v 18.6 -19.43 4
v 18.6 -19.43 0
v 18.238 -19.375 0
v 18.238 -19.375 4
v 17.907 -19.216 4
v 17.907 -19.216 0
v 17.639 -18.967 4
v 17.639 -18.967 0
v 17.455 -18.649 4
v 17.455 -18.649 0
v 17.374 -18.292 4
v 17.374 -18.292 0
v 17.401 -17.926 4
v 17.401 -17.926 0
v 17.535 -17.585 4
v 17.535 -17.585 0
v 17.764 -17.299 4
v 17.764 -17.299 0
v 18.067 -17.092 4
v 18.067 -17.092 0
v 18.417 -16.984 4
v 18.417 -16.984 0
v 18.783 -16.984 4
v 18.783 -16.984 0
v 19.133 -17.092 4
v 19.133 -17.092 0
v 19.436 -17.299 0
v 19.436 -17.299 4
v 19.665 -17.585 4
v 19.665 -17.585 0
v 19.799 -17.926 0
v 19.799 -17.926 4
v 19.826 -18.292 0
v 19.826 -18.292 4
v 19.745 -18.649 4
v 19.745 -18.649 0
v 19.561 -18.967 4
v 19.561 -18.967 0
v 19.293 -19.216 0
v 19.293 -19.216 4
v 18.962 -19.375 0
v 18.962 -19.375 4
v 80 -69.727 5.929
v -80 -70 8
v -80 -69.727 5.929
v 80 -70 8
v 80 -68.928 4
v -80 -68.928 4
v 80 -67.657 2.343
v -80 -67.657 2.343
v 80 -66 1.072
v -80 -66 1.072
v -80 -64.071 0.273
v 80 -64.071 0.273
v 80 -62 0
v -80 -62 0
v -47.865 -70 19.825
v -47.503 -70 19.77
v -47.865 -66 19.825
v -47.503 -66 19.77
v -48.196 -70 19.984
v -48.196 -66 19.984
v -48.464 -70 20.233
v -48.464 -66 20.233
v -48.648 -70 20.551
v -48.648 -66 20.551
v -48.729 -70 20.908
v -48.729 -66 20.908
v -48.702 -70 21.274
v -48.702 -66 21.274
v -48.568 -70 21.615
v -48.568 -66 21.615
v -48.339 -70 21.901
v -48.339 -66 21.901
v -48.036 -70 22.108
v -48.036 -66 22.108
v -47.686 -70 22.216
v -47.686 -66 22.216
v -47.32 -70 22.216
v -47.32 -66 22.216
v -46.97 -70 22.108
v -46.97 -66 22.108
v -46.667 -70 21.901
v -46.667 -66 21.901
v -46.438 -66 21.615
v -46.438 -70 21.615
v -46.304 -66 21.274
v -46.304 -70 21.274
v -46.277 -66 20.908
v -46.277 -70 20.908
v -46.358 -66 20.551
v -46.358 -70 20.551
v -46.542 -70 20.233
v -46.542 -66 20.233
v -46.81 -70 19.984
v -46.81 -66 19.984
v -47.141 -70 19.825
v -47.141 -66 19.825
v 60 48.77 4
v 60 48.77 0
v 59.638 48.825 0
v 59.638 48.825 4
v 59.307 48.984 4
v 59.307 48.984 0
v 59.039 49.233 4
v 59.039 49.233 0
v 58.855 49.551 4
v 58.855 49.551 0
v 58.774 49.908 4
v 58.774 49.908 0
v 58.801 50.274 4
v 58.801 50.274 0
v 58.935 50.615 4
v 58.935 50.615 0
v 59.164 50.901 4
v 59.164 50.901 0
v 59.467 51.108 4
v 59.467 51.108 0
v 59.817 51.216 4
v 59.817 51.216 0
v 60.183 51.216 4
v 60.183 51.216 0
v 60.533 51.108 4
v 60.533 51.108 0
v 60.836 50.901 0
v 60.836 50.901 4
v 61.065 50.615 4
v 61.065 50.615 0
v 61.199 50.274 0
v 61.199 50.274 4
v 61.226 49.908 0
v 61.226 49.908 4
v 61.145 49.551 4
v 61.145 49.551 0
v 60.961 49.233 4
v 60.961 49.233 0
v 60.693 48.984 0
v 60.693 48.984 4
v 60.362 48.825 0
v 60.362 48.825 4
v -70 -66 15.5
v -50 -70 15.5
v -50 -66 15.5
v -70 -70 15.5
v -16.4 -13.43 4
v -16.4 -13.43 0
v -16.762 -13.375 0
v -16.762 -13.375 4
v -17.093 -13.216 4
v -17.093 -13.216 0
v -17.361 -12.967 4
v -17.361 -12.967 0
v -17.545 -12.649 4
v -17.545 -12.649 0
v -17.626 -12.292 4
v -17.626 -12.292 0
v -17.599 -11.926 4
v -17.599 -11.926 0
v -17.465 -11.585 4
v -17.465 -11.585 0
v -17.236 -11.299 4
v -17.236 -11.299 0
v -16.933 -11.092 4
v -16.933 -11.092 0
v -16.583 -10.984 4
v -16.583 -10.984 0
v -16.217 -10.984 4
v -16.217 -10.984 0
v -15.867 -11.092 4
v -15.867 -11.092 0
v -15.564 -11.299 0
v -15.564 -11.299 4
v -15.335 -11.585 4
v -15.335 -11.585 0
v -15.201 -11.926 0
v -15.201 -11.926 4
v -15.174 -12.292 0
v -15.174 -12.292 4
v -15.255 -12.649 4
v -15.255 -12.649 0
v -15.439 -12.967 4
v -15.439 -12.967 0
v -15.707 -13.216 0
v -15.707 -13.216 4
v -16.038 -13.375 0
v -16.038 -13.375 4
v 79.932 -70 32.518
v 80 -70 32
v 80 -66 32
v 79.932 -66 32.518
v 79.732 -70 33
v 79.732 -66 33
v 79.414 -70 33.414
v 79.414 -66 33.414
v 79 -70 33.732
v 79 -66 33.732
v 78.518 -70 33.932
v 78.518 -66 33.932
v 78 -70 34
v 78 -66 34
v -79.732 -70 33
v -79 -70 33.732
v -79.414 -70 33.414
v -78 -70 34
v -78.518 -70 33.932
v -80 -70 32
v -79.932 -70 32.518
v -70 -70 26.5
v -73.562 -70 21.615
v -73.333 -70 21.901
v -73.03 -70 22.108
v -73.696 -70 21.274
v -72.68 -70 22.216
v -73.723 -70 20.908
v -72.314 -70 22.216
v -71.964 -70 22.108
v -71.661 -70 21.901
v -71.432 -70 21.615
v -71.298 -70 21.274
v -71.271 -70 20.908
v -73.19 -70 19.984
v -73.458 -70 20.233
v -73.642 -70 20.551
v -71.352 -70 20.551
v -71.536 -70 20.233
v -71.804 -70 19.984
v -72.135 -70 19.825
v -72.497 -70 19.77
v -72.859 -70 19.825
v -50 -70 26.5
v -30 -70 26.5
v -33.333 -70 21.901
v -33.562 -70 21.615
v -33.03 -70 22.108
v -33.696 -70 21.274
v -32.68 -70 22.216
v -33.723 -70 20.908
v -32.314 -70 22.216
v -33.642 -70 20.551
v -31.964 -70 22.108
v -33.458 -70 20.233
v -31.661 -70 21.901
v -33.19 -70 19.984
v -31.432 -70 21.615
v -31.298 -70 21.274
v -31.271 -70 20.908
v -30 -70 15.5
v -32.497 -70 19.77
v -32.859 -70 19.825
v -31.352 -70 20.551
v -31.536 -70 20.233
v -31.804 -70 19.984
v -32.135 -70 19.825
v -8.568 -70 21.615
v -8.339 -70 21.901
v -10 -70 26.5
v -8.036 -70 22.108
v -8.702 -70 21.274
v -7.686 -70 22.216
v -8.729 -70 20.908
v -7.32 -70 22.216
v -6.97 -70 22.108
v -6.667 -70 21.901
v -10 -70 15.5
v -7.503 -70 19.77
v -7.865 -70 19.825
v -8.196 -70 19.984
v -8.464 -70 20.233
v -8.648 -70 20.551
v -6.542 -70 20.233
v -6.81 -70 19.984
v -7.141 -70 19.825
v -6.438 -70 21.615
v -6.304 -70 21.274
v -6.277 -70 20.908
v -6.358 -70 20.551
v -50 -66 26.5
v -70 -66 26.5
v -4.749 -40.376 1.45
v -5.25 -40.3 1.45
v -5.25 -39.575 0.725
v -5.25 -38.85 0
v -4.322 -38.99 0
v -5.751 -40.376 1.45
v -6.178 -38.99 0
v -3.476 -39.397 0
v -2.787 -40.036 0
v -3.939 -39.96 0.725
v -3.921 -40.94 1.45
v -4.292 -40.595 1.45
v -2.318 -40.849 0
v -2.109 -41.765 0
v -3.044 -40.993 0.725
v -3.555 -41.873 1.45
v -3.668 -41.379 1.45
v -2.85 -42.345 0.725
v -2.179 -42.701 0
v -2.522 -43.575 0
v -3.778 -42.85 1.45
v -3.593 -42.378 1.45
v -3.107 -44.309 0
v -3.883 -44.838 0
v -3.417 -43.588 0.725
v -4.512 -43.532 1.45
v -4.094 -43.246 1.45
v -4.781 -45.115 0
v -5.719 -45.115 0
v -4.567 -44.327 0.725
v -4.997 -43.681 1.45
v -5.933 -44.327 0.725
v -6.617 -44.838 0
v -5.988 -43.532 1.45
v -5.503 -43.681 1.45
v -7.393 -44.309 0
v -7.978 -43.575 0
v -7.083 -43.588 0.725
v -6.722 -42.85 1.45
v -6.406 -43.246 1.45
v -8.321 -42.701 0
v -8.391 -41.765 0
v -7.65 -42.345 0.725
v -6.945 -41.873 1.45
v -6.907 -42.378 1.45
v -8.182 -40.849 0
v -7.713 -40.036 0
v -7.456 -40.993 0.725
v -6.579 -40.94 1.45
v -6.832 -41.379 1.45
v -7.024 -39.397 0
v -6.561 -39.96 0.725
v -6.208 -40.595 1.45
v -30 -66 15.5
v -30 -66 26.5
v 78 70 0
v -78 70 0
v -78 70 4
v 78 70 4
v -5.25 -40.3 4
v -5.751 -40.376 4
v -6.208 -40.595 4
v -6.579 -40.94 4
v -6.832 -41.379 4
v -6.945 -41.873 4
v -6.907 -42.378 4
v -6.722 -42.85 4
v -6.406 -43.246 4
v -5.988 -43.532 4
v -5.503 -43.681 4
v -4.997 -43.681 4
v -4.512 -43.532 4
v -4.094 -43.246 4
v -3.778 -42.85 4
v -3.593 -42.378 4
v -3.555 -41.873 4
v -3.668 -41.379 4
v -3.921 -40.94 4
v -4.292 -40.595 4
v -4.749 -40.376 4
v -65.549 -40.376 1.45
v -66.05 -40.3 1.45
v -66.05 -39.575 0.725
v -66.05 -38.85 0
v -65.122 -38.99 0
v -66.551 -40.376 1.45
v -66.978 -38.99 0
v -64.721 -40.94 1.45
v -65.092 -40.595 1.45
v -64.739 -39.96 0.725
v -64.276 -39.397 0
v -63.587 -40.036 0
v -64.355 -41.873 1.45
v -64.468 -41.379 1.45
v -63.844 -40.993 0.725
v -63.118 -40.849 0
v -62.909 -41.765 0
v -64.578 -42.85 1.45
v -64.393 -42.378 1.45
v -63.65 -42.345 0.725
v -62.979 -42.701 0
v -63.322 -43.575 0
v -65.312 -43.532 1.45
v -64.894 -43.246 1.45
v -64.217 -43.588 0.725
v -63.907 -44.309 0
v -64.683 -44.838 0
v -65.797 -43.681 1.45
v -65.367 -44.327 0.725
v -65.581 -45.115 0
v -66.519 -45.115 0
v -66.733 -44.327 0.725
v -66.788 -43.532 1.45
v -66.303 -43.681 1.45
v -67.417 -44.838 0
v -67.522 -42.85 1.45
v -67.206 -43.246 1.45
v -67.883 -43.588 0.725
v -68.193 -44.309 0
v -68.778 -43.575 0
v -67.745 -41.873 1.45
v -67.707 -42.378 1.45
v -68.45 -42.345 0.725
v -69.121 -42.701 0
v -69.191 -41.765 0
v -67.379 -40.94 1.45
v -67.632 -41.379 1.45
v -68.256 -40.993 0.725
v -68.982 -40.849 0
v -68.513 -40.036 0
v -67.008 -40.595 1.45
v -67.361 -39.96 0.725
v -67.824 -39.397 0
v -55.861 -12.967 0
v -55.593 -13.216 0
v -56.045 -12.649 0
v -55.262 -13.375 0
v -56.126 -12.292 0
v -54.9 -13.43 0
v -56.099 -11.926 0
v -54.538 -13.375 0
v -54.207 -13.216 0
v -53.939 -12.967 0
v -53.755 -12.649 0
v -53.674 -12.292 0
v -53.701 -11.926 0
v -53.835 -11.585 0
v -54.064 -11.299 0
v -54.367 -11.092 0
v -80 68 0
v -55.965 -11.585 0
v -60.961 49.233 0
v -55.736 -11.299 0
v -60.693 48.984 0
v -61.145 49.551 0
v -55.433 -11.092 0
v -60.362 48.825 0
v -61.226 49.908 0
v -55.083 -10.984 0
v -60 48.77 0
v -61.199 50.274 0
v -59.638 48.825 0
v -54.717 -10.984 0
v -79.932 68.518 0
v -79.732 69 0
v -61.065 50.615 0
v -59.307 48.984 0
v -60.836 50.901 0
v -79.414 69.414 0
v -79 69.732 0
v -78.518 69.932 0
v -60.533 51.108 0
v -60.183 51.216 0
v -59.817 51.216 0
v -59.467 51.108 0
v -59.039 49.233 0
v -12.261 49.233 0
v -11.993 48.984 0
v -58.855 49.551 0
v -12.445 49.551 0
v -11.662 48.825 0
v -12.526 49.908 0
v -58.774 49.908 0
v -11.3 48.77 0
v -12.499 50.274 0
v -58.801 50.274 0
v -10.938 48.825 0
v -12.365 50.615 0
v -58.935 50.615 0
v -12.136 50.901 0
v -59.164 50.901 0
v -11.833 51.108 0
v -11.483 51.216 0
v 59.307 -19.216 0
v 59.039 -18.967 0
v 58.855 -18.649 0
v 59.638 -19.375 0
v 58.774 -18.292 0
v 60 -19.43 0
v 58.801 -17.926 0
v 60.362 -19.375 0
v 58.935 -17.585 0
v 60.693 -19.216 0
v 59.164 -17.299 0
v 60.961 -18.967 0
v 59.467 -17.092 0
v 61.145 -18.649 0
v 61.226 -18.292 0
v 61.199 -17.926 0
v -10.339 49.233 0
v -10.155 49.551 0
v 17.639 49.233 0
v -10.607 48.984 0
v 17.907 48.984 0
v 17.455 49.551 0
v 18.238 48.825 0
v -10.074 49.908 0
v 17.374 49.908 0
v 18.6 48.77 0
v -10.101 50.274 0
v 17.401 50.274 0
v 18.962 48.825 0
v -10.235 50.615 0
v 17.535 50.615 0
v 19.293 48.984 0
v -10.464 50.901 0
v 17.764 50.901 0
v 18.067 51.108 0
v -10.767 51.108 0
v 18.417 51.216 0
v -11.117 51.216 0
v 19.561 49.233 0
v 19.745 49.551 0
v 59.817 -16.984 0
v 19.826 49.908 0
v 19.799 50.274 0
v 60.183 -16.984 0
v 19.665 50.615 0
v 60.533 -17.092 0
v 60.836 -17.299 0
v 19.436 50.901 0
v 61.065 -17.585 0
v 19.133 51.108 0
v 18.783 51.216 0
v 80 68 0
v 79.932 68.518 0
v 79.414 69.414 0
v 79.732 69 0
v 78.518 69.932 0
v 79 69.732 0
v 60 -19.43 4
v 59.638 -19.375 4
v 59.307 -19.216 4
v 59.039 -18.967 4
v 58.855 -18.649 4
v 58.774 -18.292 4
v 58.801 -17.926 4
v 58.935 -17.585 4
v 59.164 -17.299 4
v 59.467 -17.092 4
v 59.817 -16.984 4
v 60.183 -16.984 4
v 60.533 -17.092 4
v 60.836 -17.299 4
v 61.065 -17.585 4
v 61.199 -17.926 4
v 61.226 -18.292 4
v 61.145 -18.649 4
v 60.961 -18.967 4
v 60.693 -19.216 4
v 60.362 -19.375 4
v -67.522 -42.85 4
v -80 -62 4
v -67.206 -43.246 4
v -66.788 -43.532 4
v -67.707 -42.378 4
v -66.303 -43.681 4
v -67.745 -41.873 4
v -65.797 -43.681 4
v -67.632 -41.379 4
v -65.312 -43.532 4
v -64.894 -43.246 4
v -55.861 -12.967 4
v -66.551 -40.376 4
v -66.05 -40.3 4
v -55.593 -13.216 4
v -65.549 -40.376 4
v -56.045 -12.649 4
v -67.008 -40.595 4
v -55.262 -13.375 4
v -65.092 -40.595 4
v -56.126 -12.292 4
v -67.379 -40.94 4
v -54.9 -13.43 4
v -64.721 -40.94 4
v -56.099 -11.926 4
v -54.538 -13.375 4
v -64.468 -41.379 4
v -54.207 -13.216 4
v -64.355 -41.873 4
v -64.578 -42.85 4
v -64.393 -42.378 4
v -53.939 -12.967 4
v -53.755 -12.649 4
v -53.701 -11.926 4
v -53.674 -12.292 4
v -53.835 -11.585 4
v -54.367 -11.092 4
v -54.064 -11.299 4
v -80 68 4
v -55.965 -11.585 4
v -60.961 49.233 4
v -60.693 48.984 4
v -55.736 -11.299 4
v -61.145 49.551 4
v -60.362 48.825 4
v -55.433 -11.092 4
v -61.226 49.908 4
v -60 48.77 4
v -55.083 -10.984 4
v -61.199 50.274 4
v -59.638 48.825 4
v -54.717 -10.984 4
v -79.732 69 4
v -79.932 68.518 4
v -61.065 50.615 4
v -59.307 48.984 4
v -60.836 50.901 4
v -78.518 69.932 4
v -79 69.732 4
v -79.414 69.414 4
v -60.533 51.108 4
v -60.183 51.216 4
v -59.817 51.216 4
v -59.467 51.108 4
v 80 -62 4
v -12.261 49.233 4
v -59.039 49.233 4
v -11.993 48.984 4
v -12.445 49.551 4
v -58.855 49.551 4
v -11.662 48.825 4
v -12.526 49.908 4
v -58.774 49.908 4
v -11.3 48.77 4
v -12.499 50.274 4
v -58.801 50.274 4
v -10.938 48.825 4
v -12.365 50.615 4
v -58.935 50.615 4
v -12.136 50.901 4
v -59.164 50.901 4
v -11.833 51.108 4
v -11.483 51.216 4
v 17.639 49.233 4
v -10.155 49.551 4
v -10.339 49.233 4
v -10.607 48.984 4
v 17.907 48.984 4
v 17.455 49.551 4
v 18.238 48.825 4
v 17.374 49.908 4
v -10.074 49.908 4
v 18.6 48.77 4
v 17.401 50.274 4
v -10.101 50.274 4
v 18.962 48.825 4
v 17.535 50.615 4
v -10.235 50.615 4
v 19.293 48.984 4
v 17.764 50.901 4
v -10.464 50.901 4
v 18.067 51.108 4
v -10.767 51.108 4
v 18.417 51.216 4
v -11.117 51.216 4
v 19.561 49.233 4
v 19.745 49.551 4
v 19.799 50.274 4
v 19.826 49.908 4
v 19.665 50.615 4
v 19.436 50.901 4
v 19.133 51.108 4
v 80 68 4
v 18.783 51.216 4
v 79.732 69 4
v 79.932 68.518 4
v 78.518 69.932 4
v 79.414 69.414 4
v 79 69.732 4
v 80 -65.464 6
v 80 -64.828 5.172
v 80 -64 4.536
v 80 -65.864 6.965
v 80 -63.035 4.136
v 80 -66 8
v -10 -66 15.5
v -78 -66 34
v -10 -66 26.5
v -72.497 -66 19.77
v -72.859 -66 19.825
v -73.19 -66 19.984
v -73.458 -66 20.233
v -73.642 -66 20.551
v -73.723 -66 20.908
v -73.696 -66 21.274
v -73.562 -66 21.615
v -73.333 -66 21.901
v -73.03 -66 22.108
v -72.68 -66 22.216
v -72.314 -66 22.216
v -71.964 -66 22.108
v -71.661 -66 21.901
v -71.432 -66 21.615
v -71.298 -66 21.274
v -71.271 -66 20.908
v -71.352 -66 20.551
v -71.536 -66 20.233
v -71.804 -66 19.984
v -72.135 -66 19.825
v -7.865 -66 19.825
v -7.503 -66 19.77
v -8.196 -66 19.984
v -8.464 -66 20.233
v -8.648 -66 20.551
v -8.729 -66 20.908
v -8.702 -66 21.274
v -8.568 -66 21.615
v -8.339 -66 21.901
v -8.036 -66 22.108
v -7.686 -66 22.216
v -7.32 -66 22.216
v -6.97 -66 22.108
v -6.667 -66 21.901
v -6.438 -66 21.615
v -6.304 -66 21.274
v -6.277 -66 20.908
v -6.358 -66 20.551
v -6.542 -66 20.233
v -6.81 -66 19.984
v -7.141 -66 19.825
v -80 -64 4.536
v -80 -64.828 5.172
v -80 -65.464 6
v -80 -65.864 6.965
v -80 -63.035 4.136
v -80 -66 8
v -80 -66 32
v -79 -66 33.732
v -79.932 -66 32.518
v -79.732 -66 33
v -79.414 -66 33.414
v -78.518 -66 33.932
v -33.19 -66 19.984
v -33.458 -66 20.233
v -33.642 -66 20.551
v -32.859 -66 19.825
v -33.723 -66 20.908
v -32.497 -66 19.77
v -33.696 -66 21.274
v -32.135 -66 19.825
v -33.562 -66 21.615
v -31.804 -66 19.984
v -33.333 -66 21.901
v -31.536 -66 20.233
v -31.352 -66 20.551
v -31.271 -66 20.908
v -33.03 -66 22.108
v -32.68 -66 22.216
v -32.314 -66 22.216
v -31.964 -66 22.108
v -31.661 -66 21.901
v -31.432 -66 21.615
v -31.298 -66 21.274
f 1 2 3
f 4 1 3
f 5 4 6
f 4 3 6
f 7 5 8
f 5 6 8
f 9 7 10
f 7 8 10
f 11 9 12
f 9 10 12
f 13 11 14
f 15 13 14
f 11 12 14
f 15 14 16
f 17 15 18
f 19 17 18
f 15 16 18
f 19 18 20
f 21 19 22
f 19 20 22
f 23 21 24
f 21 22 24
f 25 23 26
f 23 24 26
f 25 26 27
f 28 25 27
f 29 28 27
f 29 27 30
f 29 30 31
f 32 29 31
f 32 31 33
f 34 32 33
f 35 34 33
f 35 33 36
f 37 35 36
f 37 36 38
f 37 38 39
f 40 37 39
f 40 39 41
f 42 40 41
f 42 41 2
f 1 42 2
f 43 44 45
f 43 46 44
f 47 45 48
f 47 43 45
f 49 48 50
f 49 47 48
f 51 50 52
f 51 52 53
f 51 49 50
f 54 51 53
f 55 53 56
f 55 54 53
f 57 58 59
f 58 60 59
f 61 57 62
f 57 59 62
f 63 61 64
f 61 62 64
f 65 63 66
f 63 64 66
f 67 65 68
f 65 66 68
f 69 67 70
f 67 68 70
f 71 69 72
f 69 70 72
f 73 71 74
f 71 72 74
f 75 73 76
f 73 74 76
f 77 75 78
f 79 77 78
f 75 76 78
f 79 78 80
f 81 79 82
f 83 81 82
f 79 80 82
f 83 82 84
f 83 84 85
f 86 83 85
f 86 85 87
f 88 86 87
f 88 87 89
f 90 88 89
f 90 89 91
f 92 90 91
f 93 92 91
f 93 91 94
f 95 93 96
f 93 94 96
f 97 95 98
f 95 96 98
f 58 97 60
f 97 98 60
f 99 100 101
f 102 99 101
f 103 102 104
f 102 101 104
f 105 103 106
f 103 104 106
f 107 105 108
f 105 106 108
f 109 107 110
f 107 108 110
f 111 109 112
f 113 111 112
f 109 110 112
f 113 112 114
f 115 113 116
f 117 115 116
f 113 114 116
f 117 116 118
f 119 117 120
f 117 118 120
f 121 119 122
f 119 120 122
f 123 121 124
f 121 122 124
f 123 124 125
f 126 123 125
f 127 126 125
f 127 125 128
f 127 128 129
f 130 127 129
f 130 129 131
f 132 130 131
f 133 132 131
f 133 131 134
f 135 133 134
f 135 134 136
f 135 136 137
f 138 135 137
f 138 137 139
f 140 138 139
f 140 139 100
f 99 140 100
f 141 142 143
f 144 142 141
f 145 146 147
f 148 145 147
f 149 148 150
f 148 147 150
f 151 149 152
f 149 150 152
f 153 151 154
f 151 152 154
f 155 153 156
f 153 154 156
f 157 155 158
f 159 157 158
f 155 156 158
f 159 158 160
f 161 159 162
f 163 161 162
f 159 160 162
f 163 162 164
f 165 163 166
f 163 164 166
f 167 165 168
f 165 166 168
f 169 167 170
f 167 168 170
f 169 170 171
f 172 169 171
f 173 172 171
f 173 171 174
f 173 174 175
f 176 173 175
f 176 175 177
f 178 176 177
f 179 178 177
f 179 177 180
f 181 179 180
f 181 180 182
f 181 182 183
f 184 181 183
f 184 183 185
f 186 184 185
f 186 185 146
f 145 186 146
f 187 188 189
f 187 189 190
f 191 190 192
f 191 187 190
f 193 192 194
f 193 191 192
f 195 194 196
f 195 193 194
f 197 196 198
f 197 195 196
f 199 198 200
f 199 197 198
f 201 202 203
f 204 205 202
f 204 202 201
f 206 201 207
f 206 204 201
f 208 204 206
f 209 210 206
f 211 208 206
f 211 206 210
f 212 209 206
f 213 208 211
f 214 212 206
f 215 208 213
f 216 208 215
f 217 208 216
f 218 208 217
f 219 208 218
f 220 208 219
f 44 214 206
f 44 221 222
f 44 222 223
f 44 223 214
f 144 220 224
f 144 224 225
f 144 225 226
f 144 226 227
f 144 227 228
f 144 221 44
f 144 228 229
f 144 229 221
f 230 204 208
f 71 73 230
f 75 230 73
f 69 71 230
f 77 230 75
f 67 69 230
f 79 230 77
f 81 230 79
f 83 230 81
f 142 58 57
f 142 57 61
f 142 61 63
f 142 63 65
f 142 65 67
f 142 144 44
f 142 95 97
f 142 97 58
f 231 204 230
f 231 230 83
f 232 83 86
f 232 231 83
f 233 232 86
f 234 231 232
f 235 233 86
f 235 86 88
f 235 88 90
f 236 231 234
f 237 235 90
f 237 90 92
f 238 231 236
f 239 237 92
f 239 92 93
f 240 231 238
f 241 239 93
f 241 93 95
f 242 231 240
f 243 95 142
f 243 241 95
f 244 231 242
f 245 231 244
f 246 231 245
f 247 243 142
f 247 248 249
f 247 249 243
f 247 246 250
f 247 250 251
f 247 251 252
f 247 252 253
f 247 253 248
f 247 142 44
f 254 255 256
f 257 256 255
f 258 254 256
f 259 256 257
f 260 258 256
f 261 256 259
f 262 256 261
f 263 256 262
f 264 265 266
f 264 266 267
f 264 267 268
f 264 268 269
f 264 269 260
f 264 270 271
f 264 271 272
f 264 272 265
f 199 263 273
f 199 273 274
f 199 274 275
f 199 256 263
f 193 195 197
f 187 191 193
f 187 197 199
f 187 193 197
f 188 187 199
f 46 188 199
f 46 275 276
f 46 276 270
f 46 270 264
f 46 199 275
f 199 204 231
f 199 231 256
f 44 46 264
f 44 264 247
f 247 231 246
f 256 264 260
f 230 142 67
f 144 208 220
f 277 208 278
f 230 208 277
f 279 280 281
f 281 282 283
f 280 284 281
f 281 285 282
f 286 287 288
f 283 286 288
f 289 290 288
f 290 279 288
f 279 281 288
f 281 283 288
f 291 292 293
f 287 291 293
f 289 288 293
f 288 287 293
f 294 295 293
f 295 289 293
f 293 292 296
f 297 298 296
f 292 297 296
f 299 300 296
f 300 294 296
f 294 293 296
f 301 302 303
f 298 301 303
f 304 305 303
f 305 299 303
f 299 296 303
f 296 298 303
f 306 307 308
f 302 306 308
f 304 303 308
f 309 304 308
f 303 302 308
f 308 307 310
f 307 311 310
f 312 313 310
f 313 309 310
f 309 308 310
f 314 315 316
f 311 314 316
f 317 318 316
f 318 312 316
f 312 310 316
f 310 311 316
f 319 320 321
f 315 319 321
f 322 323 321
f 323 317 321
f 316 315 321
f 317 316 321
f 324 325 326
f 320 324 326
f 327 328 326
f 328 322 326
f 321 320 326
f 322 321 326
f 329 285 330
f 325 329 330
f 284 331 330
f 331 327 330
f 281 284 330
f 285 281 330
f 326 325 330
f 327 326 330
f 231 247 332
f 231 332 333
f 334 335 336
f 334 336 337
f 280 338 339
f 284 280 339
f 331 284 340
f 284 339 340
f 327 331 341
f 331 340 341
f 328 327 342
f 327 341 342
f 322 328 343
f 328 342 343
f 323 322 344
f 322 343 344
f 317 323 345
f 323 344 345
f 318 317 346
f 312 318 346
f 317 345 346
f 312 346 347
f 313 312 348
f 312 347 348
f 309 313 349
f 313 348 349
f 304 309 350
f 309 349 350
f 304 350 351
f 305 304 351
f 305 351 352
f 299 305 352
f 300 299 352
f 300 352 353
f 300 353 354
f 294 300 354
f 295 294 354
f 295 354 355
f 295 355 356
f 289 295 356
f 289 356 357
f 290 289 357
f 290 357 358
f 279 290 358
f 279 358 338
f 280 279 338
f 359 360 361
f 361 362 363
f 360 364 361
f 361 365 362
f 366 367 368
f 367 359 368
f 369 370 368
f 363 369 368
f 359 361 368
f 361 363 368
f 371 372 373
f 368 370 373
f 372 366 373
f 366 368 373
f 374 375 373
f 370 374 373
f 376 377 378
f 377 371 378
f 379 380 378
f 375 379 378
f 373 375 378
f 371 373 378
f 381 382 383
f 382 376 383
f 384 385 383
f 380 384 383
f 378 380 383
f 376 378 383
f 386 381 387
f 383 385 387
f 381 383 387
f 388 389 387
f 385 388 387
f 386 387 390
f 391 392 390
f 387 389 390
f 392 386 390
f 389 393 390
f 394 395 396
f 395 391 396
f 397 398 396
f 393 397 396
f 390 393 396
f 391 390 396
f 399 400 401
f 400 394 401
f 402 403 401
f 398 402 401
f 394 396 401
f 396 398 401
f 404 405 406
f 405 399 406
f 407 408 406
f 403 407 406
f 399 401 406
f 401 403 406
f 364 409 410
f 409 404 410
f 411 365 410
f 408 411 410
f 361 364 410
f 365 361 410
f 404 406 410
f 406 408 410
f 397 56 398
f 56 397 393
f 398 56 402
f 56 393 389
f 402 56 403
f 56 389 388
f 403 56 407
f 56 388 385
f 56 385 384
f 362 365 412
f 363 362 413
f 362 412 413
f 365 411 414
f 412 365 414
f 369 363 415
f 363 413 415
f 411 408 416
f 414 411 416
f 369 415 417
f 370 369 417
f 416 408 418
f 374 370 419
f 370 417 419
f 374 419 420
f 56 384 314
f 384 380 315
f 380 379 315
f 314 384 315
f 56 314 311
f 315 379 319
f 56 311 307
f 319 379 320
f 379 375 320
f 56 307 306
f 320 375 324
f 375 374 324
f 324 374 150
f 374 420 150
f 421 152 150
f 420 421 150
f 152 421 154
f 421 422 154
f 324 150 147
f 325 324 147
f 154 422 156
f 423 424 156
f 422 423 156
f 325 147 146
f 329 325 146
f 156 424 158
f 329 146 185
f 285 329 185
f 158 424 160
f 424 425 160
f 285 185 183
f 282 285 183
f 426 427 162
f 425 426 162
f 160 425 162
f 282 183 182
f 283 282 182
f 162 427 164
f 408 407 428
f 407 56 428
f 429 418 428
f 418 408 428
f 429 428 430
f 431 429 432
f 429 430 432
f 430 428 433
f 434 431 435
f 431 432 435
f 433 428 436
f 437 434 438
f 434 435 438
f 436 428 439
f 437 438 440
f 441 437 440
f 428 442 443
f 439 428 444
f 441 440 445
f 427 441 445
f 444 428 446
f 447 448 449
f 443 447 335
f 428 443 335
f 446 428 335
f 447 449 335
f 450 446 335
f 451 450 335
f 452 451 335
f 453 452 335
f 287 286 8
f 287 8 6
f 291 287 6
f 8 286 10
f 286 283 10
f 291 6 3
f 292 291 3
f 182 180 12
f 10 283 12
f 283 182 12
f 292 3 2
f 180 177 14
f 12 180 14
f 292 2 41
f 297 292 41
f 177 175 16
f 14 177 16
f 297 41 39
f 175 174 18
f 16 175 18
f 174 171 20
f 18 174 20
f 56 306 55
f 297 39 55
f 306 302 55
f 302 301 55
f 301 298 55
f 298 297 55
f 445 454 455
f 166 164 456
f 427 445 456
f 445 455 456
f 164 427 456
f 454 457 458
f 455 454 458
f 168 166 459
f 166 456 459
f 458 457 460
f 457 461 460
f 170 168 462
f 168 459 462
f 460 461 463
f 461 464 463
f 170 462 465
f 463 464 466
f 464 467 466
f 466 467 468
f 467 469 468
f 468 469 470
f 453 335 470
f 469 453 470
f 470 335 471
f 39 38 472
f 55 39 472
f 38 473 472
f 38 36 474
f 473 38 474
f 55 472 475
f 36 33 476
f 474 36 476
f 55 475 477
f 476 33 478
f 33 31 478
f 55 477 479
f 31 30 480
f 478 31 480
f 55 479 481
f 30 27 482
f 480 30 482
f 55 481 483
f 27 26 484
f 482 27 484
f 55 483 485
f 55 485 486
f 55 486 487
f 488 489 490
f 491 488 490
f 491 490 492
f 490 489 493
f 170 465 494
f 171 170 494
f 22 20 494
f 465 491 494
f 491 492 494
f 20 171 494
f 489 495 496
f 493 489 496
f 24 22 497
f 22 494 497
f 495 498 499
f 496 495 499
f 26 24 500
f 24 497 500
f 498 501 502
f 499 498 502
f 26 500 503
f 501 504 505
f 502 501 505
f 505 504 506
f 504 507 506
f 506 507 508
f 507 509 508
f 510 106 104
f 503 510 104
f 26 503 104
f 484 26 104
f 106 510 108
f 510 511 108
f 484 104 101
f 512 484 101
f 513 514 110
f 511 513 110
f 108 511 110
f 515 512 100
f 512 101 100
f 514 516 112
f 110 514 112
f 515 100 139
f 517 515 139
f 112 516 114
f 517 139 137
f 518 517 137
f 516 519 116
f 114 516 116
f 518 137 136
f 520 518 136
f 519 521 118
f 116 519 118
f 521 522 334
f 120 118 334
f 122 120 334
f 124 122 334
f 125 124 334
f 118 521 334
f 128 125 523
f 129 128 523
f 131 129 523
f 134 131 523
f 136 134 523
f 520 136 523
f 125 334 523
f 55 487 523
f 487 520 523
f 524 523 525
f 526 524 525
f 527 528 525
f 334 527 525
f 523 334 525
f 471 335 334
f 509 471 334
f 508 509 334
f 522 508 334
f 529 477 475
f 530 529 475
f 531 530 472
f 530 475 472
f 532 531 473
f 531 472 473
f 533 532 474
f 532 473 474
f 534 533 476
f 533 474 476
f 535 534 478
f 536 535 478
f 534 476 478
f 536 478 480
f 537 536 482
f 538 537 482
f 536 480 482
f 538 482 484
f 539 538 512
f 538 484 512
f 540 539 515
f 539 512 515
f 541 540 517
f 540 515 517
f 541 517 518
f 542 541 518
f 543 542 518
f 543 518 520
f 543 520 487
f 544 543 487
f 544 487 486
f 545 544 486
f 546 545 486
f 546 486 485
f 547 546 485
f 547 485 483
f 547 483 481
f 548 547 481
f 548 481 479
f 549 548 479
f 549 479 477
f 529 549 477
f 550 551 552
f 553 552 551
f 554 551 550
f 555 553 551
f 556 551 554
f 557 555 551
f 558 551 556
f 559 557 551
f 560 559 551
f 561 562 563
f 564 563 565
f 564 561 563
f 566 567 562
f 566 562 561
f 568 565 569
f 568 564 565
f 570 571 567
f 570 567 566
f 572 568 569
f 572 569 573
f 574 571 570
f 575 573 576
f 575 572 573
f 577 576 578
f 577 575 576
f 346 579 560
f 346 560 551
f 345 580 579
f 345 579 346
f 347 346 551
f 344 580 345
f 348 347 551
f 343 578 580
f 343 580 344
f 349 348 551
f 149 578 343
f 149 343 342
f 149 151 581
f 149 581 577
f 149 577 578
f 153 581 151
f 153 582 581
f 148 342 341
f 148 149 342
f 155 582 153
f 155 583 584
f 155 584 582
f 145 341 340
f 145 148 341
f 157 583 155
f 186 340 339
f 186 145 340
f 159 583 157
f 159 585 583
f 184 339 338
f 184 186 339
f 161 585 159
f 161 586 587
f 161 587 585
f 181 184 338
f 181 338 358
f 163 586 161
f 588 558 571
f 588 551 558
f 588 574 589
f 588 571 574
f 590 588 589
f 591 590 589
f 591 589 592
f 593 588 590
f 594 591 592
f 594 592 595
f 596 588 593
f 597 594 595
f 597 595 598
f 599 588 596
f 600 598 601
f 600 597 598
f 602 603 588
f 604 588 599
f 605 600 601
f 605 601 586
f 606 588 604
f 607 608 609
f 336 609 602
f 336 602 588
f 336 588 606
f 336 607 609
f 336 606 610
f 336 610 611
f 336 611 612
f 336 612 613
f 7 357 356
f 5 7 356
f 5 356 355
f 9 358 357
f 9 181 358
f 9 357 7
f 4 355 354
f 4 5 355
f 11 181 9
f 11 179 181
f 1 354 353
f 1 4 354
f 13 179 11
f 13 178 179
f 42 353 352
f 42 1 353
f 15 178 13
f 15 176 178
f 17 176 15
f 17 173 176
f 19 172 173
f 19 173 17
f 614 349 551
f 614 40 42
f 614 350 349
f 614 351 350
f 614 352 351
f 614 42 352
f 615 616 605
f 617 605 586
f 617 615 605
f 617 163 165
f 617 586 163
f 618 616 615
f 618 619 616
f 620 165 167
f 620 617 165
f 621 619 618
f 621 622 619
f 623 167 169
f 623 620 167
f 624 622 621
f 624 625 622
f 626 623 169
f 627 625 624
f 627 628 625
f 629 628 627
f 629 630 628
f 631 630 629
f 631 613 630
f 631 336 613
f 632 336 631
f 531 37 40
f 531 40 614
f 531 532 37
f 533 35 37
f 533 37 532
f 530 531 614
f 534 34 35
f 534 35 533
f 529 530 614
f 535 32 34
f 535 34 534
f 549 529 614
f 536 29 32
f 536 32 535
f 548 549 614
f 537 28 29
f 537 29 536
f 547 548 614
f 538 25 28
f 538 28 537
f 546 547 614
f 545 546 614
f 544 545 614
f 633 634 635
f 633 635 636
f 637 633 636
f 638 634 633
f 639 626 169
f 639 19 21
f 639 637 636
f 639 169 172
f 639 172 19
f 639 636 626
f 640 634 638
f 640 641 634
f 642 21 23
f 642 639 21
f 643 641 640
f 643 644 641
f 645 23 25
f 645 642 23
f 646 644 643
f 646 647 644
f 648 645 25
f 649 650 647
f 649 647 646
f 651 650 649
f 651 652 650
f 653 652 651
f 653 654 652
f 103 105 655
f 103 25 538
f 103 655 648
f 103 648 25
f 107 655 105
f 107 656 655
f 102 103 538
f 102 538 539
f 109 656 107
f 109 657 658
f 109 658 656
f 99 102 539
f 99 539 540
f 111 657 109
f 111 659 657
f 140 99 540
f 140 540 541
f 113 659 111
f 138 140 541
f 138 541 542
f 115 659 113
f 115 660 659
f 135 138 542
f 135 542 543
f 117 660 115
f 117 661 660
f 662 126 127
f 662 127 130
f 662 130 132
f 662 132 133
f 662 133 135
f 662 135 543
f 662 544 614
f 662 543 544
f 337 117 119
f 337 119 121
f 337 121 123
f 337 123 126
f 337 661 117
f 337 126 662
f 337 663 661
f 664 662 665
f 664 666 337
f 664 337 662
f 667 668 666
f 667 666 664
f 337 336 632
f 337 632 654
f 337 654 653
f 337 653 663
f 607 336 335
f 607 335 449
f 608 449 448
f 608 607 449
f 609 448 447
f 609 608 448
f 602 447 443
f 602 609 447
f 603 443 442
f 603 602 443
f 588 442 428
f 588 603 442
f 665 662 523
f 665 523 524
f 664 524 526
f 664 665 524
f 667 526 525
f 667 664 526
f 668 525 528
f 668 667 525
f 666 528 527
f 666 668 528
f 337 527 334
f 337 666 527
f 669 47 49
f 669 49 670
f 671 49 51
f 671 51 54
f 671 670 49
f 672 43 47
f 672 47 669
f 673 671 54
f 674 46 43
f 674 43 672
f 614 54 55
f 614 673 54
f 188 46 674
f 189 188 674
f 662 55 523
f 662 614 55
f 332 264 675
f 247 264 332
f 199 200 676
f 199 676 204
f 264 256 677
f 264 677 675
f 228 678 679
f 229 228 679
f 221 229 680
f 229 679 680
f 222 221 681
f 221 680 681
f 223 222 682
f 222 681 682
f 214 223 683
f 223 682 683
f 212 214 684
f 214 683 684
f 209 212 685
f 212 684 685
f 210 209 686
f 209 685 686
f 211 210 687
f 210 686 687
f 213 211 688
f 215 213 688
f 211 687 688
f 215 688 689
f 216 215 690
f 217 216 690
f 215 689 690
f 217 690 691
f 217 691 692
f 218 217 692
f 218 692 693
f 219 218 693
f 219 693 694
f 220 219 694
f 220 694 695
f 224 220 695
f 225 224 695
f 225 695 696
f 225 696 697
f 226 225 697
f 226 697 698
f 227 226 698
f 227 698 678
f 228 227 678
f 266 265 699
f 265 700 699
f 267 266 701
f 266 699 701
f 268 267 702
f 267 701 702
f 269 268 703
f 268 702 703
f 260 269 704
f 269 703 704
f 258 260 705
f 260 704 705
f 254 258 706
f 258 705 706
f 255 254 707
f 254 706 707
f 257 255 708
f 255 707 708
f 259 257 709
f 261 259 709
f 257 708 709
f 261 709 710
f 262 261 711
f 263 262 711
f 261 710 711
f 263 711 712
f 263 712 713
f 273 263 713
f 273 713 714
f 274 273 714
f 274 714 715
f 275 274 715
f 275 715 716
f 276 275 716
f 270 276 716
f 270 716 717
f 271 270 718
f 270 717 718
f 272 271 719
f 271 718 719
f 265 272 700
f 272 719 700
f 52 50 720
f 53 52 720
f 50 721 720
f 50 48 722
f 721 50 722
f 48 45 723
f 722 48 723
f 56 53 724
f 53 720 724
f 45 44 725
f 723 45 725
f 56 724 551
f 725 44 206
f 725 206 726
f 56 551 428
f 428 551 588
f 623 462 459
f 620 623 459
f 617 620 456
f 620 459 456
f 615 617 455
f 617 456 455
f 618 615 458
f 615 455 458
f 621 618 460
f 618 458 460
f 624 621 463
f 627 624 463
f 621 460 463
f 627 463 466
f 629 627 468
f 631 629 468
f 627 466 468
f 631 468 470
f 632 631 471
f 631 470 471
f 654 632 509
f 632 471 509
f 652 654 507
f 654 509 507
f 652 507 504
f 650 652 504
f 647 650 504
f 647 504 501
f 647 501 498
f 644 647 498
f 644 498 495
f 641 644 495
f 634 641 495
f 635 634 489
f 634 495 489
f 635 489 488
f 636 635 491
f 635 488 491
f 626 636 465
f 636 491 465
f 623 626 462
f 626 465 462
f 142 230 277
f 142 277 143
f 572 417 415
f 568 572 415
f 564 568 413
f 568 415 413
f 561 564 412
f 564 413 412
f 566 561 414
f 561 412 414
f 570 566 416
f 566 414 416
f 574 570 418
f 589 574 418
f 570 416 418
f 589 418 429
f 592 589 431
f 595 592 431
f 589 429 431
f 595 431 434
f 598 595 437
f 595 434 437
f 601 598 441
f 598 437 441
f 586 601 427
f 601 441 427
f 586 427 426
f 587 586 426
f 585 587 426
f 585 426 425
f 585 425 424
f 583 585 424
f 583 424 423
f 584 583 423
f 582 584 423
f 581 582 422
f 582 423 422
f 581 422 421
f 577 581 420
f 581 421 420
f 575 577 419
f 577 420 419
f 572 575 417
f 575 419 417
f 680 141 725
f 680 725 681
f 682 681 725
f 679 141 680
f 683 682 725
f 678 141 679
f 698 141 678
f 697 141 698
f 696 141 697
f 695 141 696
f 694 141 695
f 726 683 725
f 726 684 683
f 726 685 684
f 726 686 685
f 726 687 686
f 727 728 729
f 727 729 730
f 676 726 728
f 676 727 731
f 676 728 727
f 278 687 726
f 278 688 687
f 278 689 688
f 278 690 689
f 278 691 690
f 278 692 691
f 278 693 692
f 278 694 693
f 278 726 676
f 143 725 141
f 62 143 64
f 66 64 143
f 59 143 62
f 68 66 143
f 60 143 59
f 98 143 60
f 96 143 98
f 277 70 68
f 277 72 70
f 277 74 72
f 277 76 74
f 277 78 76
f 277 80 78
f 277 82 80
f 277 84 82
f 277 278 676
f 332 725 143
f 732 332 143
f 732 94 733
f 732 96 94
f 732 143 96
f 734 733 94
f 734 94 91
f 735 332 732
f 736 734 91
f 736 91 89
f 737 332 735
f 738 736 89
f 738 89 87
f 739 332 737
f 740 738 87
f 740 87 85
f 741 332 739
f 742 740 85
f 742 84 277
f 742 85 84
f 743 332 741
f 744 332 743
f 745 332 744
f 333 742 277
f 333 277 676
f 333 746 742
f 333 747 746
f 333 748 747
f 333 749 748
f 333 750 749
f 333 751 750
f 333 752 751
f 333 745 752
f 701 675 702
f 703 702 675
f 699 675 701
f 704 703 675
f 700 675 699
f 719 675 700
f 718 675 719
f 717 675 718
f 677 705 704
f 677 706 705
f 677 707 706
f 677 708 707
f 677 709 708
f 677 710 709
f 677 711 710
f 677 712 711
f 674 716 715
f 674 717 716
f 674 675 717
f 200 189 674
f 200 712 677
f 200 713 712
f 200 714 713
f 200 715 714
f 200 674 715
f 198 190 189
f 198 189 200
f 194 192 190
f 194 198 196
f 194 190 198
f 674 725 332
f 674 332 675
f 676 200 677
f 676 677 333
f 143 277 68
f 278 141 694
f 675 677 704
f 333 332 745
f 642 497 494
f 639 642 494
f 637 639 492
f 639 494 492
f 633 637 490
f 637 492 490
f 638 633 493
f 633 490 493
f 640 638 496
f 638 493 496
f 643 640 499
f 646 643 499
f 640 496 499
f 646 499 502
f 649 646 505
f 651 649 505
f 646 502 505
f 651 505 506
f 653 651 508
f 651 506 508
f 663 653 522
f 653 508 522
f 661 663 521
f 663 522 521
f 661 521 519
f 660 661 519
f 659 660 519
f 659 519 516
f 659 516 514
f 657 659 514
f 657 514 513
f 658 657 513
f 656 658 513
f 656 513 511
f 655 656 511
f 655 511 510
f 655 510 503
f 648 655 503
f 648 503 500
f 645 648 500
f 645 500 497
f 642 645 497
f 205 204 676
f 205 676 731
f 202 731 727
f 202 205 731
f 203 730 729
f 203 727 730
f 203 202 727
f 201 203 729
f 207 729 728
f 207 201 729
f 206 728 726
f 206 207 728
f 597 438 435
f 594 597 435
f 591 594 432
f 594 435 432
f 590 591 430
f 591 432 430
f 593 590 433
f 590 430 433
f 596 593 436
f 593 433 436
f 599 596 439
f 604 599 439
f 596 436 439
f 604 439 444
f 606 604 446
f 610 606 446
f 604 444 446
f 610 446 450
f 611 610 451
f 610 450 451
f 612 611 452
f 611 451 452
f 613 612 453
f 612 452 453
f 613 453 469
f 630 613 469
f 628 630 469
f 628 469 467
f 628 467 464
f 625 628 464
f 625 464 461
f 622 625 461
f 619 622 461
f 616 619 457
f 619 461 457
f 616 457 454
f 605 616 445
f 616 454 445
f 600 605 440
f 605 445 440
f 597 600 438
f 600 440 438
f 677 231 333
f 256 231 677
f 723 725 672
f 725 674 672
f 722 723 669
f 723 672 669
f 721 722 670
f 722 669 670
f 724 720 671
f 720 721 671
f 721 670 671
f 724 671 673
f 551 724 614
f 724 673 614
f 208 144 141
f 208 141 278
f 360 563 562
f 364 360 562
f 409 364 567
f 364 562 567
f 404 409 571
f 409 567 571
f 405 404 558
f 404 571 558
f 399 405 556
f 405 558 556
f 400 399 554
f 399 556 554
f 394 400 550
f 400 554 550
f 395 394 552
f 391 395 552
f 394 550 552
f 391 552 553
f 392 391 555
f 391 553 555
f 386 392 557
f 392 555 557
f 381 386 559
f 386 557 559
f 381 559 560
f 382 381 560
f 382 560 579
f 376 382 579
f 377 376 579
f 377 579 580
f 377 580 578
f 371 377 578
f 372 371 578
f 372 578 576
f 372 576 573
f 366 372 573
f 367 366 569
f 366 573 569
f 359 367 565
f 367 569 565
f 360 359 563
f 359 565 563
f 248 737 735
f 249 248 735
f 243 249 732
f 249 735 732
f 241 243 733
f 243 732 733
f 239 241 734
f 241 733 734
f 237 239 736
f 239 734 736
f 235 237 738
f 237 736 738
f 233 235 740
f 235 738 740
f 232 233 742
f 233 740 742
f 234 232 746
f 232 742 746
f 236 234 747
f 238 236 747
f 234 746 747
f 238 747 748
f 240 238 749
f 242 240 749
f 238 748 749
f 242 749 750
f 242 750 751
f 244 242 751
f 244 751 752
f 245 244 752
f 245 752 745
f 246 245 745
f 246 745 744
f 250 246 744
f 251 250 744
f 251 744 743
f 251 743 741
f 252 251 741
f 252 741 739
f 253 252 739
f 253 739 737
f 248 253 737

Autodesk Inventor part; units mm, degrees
ref_plane "Plan YZ" through (0, 0, 0) normal (1, 0, 0) x (0, 1, 0)
ref_plane "Plan XZ" through (0, 0, 0) normal (0, 1, 0) x (-1, 0, 0)
ref_plane "Plan XY" through (0, 0, 0) normal (0, 0, 1) x (1, 0, 0)
sketch "Esquisse1" plane through (0, 0, 0) normal (0, 0, 1) x (1, 0, 0)
  line L0 (-78, 70) -> (78, 70)
  line L1 (80, 68) -> (80, -68)
  line L2 (78, -70) -> (-78, -70)
  line L3 (-80, -68) -> (-80, 68)
  line L4 (-112, 0) -> (112, 0) construction
  line L5 (0, -98) -> (0, 98) construction
  line L6 (-80, 68) -> (-80, 70)
  line L7 (-80, 70) -> (-78, 70)
  line L8 (80, 68) -> (80, 70)
  line L9 (78, 70) -> (80, 70)
  line L10 (-78, -70) -> (-80, -70)
  line L11 (-80, -70) -> (-80, -68)
  line L12 (78, -70) -> (80, -70)
  line L13 (80, -70) -> (80, -68)
  point P0 (0, 0)
  dimension "d0" = 160
  dimension "d1" = 140
extrude "Extrusion1" add sketch "Esquisse1" along normal blind 4
sketch "Esquisse5" plane through (0, 0, 4) normal (0, 0, 1) x (1, 0, 0)
  line L0 (18.6, 50) -> (60, 50) construction
  line L1 (60, 50) -> (60, -18.2) construction
  line L2 (60, -18.2) -> (18.6, -18.2) construction
  line L3 (18.6, -18.2) -> (18.6, 50) construction
  line L4 (80, -70.465) -> (80, 70)
  line L5 (80, 70) -> (-80, 70)
  line L6 (80, 70) -> (-80, 70) projected
  line L7 (80, -70) -> (80, 70) projected
  point P0 (0, 0)
  point P1 (0, 0)
  point P2 (78, 70)
  point P3 (-78, 70)
  point P4 (80, -68)
  point P5 (80, 68)
  dimension "d12" = 41.4
  dimension "d13" = 68.2
  dimension "d14" = 20
  dimension "d15" = 20
hole "Perçage1" at (18.6, 50, 4) at (60, 50, 4) at (18.6, -18.2, 4) at (60, -18.2, 4) direction (0, 0, -1) diameter 2.459 end through all thread size "M3x0.5" class "6H" standard "ISO M"
sketch "Esquisse6" plane through (0, 0, 4) normal (0, 0, 1) x (1, 0, 0)
  line L0 (-60, 50) -> (-11.3, 50) construction
  line L1 (-11.3, 50) -> (-11.3, -12.2) construction
  line L2 (-11.3, -12.2) -> (-60, -12.2) construction
  line L3 (-60, -12.2) -> (-60, 50) construction
  line L4 (-35.65, 66.5768) -> (-35.65, 16.8329)
  line L5 (-80, 70) -> (-80, -63.3699)
  line L6 (-80, 70) -> (-80, -70) construction
  line L7 (80, 70) -> (-80, 70) projected
  circle A0 centre (18.6, 50) radius 1.2295 construction
  point P0 (0, 0)
  point P1 (0, 0)
  point P2 (-54.9, -12.2)
  point P3 (-16.4, -12.2)
  point P4 (-80, 68)
  point P5 (-80, -68)
  point P6 (78, 70)
  point P7 (-78, 70)
  dimension "d23" = 62.2
  dimension "d24" = 38.5
  dimension "d25" = 48.7
  dimension "d26" = 48.7
  dimension "d27" = 20
hole "Perçage2" at (-54.9, -12.2, 4) at (-16.4, -12.2, 4) at (-60, 50, 4) at (-11.3, 50, 4) direction (0, 0, -1) diameter 2.459 end through all thread size "M3x0.5" class "6H" standard "ISO M"
sketch "Esquisse10" plane through (80, -66, 0) normal (0, -1, 0) x (1, 0, 0)
  line L0 (-160, 0) -> (0, 0)
  line L1 (0, 0) -> (0, 34)
  line L2 (0, 34) -> (-160, 34)
  line L3 (-160, 34) -> (-160, 0)
edge flange "Bord tombé2" height 34 angle 90 thickness 4 bend radius 4 thickness toward (0, -1, 0) relief straight relief width 4 relief depth 2 edges at (0, -70, 4) wall of the first edge with corners at (-80, -66, 0) (80, -66, 0) (80, -66, 34) (-80, -66, 34)
bend "Pli3"
corner "Coin2"
fillet "Congé1" radius 2 4 edges at (-80, -68, 34) (80, -68, 34) (80, 70, 2) (-80, 70, 2)
sketch "Esquisse13" plane through (0, 0, 0) normal (0, 0, -1) x (-1, 0, 0)
  line L0 (35.65, 25.8994) -> (35.65, -17.0856) construction
  line L1 (80, -70) -> (-80, -70) construction
  line L2 (80, 70) -> (80, -62) construction
  line L3 (151.9558, 0) -> (-118.6593, 0) construction
  line L4 (80, -62) -> (-80, -62) projected
  point P0 (0, 0)
  point P1 (0, 0)
  point P2 (0, 0)
  point P3 (66.05, -42)
  point P4 (5.25, -42)
  point P5 (16.4, 8.1)
  point P6 (80, 68)
  dimension "d102" = 38.5
  dimension "d107" = 60.8
  dimension "d115" = 20
hole "Perçage4" at (-5.25, -42, 0) at (-66.05, -42, 0) direction (0, 0, 1) diameter 3.4 end through all countersink diameter 6.3 countersink angle 90 clearance for "Vis à tête plate fraisée ISO 2009/7046" size "M3" standard "ISO"
sketch "Esquisse12" plane through (-80, -70, 8) normal (0, -1, 0) x (1, 0, 0)
  line L0 (10, 18.5) -> (30, 18.5)
  line L1 (30, 18.5) -> (30, 7.5)
  line L2 (30, 7.5) -> (10, 7.5)
  line L3 (10, 7.5) -> (10, 18.5)
  line L4 (50, 18.5) -> (70, 18.5)
  line L5 (70, 18.5) -> (70, 7.5)
  line L6 (70, 7.5) -> (50, 7.5)
  line L7 (50, 7.5) -> (50, 18.5)
  line L8 (2, 26) -> (158, 26)
  line L9 (-10.9148, 13) -> (171.3992, 13)
  line L10 (20, 22.4004) -> (20, 5.8983)
  line L11 (60, 25.3782) -> (60, 6.6427)
  line L12 (0, -0.9203) -> (0, 29.0797)
  line L13 (40, 26) -> (40, -5.9495)
  line L14 (0, 0) -> (0, 26) projected
  line L15 (0, 26) -> (160, 26) projected
  point P0 (80, -8)
  point P1 (80, -2)
  point P2 (0, 24)
  point P3 (2, 26)
  point P4 (158, 26)
  point P5 (7.503, 13)
  point P6 (32.497, 13)
  point P7 (47.503, 13)
  point P8 (72.497, 13)
  dimension "d81" = 26
  dimension "d82" = 11
  dimension "d83" = 20
  dimension "d84" = 20
  dimension "d85" = 20
  dimension "d89" = 20
  dimension "d90" = 80
  dimension "d116" = 24.994
  dimension "d117" = 24.994
extrude "Extrusion5" cut sketch "Esquisse12" against normal through all contours L0 L10 L9 L3 | L0 L1 L9 L10 | L9 L10 L2 L3 | L9 L1 L2 L10 | L4 L11 L9 L7 | L4 L5 L9 L11 | L9 L11 L6 L7 | L9 L5 L6 L11
hole "Perçage5" at (-72.497, -70, 21) at (-47.503, -70, 21) at (-32.497, -70, 21) at (-7.503, -70, 21) direction (0, 1, 0) diameter 2.459 end through all thread size "M3x0.5" class "6H" standard "ISO M"
equation "\"d26\" = d25"
equation "\"d102\" = d24"
equation "\"d113\" = Epaisseur"
equation "\"d90\" = 0.5 * d91"
equation "\"d65\" = LargeurGrugeage"
equation "\"d66\" = ProfondeurGrugeage"
equation "\"d67\" = RestesMinimum"
equation "\"d68\" = RayonPli"
equation "\"d71\" = RayonPli"
equation "\"d72\" = TailleGrugeage"
equation "\"d73\" = TailleJeu"
equation "\"d74\" = TailleRayonJacobi"
equation "\"d117\" = d116"
equation "\"RayonPli\" = Epaisseur"
equation "\"LargeurGrugeage\" = Epaisseur"
equation "\"ProfondeurGrugeage\" = 0.5 * Epaisseur"
equation "\"TailleGrugeage\" = 4 * Epaisseur"
equation "\"RestesMinimum\" = 2 * Epaisseur"
equation "\"Rayondetransition\" = RayonPli"
equation "\"TailleRayonJacobi\" = Epaisseur"
equation "\"TailleJeu\" = Epaisseur"
equation "\"Epaisseur\" = 4"
equation "\"d91\" = 160"
properties part number "P1704_007" material "Plastique PMMA"
